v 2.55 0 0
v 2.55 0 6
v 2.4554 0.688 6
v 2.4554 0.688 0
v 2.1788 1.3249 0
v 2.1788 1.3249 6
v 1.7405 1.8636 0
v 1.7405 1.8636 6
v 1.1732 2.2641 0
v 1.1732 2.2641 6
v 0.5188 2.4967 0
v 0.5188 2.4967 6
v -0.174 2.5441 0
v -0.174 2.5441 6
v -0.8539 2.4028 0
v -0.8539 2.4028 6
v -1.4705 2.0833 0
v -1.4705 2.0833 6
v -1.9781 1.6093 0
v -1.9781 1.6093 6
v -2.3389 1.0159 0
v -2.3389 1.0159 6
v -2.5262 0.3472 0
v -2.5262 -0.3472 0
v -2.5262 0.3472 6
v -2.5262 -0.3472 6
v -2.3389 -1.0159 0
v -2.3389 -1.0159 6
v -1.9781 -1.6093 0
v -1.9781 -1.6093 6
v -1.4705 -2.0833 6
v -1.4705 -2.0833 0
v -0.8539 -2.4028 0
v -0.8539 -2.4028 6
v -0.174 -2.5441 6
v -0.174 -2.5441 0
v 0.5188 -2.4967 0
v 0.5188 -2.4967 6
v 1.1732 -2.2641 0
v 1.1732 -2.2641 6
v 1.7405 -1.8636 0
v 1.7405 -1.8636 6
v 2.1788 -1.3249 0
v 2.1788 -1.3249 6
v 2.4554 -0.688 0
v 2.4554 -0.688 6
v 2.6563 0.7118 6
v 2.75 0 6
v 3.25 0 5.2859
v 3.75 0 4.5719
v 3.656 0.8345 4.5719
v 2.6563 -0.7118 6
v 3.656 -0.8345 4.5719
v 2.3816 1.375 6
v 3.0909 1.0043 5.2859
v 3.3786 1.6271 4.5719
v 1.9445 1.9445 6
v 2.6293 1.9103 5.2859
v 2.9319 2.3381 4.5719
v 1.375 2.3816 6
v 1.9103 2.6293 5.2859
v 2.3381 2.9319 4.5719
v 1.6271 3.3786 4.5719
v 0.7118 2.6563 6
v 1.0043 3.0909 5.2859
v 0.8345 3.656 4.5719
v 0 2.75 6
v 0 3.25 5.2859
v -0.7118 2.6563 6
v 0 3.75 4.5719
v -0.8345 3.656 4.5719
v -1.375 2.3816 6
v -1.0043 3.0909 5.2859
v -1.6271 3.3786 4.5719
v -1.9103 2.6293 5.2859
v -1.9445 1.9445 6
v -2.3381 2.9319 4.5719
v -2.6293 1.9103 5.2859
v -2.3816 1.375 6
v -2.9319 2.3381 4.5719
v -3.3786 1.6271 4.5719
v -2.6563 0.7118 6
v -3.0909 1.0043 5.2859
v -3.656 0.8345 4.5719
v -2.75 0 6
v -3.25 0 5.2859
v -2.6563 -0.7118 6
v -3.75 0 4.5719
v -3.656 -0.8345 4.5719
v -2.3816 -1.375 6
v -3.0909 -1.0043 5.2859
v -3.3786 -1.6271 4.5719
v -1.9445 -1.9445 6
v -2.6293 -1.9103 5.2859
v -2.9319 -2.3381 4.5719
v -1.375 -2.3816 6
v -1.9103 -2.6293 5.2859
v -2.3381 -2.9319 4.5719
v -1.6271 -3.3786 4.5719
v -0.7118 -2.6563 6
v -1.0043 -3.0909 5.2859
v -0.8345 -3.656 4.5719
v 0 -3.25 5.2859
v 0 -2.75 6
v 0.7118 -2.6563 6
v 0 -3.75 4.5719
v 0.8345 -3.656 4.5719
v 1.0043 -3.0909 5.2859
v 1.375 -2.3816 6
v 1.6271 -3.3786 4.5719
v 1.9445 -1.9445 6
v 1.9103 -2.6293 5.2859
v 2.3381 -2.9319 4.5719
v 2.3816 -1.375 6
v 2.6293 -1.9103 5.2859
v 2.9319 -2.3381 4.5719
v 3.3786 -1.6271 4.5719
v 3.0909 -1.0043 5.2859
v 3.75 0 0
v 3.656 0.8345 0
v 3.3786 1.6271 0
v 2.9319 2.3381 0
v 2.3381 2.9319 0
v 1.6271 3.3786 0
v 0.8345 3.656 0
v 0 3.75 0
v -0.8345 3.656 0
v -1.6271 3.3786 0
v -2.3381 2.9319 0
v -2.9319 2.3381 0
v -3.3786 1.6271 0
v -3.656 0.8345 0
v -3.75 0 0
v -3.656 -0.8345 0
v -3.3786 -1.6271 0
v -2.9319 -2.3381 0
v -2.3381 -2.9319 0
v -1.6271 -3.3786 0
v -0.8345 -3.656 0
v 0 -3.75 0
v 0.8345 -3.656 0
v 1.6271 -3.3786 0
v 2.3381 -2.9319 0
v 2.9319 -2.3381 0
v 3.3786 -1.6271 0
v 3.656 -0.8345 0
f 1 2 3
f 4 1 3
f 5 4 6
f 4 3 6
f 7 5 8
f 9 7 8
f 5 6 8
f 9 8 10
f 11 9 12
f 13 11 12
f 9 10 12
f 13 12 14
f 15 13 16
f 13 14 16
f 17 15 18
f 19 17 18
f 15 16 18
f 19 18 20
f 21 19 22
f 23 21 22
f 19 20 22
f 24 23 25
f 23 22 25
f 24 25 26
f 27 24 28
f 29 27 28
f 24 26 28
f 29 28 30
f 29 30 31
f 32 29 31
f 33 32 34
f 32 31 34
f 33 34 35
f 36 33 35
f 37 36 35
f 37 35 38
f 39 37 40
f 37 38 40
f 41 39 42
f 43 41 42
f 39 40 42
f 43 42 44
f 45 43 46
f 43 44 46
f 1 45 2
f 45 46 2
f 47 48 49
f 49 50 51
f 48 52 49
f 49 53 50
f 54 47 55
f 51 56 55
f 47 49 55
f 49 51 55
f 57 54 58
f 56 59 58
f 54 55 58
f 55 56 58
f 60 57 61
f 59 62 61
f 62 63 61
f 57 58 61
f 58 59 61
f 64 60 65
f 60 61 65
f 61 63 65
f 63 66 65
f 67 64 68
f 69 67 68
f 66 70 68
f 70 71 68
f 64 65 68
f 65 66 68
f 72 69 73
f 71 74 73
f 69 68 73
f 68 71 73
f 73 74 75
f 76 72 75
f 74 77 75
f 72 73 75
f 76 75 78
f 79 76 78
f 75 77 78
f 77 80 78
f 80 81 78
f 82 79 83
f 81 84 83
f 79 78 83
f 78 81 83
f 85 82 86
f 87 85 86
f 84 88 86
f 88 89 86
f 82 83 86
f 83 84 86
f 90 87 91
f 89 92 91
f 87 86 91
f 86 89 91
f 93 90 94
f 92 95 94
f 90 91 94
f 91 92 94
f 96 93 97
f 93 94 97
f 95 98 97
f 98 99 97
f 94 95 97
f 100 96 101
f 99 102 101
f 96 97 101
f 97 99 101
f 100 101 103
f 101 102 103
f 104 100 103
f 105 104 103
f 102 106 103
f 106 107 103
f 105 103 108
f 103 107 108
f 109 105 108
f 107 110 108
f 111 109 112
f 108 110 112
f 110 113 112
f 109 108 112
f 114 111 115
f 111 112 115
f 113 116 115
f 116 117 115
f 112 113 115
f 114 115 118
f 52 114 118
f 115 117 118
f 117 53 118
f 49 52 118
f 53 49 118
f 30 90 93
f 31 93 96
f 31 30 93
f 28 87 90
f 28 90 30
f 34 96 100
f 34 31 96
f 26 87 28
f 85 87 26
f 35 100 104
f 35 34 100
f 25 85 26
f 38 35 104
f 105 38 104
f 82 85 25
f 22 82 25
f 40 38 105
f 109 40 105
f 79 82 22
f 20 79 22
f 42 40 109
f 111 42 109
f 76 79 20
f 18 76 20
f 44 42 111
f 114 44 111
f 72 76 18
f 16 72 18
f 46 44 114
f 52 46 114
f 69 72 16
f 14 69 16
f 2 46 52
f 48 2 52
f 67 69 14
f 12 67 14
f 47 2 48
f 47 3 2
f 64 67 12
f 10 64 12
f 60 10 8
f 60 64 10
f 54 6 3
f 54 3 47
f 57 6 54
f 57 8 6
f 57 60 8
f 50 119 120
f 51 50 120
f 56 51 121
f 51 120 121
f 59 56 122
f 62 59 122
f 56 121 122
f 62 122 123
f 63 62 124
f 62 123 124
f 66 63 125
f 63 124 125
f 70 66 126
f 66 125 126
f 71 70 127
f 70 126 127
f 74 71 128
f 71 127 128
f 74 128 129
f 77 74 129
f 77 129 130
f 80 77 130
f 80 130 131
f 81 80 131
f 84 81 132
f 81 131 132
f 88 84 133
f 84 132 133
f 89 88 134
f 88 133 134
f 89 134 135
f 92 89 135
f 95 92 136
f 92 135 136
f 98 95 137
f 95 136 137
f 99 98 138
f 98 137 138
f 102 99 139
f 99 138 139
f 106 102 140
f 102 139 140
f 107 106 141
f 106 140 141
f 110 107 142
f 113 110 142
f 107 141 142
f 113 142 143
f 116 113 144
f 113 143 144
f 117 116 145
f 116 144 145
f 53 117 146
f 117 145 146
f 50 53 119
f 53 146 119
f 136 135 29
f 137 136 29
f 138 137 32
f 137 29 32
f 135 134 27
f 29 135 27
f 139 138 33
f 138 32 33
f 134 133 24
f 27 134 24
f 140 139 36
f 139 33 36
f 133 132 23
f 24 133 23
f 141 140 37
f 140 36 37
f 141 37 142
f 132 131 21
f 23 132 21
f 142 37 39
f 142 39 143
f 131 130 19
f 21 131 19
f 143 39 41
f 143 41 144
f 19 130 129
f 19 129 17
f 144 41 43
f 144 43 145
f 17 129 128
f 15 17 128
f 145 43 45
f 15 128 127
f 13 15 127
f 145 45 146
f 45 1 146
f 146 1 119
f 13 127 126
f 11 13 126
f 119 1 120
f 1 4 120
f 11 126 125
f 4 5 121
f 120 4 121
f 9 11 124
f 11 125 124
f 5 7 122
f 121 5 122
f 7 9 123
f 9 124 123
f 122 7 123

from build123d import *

# Parameters (mm, degrees)
F0_R     = 3.75
F1_DEPTH = 6
F2_R     = 2.55
F3_DEPTH = 6
F4_SIZE2 = 1.4281480067
F4_SIZE  = 1


with BuildPart() as f1:
    # F0 (on Top) → F1 (new body)
    with BuildSketch(Plane.XY):
        Circle(F0_R)
    extrude(amount=F1_DEPTH)

    # F2 (on face) → F3 (cut, through all)
    with BuildSketch(Plane.XY.offset(6)):
        Circle(F2_R)
    extrude(amount=-F3_DEPTH, mode=Mode.SUBTRACT)

    # F4
    f4_edges = [f1.edges().sort_by_distance(p)[0] for p in [
        (-3.75, 0, 6),
    ]]
    f4_side = f1.faces().sort_by_distance((-3.643934, 0, 6))[0]
    chamfer(f4_edges, length=F4_SIZE, length2=F4_SIZE2, reference=f4_side)


solid = f1.part
